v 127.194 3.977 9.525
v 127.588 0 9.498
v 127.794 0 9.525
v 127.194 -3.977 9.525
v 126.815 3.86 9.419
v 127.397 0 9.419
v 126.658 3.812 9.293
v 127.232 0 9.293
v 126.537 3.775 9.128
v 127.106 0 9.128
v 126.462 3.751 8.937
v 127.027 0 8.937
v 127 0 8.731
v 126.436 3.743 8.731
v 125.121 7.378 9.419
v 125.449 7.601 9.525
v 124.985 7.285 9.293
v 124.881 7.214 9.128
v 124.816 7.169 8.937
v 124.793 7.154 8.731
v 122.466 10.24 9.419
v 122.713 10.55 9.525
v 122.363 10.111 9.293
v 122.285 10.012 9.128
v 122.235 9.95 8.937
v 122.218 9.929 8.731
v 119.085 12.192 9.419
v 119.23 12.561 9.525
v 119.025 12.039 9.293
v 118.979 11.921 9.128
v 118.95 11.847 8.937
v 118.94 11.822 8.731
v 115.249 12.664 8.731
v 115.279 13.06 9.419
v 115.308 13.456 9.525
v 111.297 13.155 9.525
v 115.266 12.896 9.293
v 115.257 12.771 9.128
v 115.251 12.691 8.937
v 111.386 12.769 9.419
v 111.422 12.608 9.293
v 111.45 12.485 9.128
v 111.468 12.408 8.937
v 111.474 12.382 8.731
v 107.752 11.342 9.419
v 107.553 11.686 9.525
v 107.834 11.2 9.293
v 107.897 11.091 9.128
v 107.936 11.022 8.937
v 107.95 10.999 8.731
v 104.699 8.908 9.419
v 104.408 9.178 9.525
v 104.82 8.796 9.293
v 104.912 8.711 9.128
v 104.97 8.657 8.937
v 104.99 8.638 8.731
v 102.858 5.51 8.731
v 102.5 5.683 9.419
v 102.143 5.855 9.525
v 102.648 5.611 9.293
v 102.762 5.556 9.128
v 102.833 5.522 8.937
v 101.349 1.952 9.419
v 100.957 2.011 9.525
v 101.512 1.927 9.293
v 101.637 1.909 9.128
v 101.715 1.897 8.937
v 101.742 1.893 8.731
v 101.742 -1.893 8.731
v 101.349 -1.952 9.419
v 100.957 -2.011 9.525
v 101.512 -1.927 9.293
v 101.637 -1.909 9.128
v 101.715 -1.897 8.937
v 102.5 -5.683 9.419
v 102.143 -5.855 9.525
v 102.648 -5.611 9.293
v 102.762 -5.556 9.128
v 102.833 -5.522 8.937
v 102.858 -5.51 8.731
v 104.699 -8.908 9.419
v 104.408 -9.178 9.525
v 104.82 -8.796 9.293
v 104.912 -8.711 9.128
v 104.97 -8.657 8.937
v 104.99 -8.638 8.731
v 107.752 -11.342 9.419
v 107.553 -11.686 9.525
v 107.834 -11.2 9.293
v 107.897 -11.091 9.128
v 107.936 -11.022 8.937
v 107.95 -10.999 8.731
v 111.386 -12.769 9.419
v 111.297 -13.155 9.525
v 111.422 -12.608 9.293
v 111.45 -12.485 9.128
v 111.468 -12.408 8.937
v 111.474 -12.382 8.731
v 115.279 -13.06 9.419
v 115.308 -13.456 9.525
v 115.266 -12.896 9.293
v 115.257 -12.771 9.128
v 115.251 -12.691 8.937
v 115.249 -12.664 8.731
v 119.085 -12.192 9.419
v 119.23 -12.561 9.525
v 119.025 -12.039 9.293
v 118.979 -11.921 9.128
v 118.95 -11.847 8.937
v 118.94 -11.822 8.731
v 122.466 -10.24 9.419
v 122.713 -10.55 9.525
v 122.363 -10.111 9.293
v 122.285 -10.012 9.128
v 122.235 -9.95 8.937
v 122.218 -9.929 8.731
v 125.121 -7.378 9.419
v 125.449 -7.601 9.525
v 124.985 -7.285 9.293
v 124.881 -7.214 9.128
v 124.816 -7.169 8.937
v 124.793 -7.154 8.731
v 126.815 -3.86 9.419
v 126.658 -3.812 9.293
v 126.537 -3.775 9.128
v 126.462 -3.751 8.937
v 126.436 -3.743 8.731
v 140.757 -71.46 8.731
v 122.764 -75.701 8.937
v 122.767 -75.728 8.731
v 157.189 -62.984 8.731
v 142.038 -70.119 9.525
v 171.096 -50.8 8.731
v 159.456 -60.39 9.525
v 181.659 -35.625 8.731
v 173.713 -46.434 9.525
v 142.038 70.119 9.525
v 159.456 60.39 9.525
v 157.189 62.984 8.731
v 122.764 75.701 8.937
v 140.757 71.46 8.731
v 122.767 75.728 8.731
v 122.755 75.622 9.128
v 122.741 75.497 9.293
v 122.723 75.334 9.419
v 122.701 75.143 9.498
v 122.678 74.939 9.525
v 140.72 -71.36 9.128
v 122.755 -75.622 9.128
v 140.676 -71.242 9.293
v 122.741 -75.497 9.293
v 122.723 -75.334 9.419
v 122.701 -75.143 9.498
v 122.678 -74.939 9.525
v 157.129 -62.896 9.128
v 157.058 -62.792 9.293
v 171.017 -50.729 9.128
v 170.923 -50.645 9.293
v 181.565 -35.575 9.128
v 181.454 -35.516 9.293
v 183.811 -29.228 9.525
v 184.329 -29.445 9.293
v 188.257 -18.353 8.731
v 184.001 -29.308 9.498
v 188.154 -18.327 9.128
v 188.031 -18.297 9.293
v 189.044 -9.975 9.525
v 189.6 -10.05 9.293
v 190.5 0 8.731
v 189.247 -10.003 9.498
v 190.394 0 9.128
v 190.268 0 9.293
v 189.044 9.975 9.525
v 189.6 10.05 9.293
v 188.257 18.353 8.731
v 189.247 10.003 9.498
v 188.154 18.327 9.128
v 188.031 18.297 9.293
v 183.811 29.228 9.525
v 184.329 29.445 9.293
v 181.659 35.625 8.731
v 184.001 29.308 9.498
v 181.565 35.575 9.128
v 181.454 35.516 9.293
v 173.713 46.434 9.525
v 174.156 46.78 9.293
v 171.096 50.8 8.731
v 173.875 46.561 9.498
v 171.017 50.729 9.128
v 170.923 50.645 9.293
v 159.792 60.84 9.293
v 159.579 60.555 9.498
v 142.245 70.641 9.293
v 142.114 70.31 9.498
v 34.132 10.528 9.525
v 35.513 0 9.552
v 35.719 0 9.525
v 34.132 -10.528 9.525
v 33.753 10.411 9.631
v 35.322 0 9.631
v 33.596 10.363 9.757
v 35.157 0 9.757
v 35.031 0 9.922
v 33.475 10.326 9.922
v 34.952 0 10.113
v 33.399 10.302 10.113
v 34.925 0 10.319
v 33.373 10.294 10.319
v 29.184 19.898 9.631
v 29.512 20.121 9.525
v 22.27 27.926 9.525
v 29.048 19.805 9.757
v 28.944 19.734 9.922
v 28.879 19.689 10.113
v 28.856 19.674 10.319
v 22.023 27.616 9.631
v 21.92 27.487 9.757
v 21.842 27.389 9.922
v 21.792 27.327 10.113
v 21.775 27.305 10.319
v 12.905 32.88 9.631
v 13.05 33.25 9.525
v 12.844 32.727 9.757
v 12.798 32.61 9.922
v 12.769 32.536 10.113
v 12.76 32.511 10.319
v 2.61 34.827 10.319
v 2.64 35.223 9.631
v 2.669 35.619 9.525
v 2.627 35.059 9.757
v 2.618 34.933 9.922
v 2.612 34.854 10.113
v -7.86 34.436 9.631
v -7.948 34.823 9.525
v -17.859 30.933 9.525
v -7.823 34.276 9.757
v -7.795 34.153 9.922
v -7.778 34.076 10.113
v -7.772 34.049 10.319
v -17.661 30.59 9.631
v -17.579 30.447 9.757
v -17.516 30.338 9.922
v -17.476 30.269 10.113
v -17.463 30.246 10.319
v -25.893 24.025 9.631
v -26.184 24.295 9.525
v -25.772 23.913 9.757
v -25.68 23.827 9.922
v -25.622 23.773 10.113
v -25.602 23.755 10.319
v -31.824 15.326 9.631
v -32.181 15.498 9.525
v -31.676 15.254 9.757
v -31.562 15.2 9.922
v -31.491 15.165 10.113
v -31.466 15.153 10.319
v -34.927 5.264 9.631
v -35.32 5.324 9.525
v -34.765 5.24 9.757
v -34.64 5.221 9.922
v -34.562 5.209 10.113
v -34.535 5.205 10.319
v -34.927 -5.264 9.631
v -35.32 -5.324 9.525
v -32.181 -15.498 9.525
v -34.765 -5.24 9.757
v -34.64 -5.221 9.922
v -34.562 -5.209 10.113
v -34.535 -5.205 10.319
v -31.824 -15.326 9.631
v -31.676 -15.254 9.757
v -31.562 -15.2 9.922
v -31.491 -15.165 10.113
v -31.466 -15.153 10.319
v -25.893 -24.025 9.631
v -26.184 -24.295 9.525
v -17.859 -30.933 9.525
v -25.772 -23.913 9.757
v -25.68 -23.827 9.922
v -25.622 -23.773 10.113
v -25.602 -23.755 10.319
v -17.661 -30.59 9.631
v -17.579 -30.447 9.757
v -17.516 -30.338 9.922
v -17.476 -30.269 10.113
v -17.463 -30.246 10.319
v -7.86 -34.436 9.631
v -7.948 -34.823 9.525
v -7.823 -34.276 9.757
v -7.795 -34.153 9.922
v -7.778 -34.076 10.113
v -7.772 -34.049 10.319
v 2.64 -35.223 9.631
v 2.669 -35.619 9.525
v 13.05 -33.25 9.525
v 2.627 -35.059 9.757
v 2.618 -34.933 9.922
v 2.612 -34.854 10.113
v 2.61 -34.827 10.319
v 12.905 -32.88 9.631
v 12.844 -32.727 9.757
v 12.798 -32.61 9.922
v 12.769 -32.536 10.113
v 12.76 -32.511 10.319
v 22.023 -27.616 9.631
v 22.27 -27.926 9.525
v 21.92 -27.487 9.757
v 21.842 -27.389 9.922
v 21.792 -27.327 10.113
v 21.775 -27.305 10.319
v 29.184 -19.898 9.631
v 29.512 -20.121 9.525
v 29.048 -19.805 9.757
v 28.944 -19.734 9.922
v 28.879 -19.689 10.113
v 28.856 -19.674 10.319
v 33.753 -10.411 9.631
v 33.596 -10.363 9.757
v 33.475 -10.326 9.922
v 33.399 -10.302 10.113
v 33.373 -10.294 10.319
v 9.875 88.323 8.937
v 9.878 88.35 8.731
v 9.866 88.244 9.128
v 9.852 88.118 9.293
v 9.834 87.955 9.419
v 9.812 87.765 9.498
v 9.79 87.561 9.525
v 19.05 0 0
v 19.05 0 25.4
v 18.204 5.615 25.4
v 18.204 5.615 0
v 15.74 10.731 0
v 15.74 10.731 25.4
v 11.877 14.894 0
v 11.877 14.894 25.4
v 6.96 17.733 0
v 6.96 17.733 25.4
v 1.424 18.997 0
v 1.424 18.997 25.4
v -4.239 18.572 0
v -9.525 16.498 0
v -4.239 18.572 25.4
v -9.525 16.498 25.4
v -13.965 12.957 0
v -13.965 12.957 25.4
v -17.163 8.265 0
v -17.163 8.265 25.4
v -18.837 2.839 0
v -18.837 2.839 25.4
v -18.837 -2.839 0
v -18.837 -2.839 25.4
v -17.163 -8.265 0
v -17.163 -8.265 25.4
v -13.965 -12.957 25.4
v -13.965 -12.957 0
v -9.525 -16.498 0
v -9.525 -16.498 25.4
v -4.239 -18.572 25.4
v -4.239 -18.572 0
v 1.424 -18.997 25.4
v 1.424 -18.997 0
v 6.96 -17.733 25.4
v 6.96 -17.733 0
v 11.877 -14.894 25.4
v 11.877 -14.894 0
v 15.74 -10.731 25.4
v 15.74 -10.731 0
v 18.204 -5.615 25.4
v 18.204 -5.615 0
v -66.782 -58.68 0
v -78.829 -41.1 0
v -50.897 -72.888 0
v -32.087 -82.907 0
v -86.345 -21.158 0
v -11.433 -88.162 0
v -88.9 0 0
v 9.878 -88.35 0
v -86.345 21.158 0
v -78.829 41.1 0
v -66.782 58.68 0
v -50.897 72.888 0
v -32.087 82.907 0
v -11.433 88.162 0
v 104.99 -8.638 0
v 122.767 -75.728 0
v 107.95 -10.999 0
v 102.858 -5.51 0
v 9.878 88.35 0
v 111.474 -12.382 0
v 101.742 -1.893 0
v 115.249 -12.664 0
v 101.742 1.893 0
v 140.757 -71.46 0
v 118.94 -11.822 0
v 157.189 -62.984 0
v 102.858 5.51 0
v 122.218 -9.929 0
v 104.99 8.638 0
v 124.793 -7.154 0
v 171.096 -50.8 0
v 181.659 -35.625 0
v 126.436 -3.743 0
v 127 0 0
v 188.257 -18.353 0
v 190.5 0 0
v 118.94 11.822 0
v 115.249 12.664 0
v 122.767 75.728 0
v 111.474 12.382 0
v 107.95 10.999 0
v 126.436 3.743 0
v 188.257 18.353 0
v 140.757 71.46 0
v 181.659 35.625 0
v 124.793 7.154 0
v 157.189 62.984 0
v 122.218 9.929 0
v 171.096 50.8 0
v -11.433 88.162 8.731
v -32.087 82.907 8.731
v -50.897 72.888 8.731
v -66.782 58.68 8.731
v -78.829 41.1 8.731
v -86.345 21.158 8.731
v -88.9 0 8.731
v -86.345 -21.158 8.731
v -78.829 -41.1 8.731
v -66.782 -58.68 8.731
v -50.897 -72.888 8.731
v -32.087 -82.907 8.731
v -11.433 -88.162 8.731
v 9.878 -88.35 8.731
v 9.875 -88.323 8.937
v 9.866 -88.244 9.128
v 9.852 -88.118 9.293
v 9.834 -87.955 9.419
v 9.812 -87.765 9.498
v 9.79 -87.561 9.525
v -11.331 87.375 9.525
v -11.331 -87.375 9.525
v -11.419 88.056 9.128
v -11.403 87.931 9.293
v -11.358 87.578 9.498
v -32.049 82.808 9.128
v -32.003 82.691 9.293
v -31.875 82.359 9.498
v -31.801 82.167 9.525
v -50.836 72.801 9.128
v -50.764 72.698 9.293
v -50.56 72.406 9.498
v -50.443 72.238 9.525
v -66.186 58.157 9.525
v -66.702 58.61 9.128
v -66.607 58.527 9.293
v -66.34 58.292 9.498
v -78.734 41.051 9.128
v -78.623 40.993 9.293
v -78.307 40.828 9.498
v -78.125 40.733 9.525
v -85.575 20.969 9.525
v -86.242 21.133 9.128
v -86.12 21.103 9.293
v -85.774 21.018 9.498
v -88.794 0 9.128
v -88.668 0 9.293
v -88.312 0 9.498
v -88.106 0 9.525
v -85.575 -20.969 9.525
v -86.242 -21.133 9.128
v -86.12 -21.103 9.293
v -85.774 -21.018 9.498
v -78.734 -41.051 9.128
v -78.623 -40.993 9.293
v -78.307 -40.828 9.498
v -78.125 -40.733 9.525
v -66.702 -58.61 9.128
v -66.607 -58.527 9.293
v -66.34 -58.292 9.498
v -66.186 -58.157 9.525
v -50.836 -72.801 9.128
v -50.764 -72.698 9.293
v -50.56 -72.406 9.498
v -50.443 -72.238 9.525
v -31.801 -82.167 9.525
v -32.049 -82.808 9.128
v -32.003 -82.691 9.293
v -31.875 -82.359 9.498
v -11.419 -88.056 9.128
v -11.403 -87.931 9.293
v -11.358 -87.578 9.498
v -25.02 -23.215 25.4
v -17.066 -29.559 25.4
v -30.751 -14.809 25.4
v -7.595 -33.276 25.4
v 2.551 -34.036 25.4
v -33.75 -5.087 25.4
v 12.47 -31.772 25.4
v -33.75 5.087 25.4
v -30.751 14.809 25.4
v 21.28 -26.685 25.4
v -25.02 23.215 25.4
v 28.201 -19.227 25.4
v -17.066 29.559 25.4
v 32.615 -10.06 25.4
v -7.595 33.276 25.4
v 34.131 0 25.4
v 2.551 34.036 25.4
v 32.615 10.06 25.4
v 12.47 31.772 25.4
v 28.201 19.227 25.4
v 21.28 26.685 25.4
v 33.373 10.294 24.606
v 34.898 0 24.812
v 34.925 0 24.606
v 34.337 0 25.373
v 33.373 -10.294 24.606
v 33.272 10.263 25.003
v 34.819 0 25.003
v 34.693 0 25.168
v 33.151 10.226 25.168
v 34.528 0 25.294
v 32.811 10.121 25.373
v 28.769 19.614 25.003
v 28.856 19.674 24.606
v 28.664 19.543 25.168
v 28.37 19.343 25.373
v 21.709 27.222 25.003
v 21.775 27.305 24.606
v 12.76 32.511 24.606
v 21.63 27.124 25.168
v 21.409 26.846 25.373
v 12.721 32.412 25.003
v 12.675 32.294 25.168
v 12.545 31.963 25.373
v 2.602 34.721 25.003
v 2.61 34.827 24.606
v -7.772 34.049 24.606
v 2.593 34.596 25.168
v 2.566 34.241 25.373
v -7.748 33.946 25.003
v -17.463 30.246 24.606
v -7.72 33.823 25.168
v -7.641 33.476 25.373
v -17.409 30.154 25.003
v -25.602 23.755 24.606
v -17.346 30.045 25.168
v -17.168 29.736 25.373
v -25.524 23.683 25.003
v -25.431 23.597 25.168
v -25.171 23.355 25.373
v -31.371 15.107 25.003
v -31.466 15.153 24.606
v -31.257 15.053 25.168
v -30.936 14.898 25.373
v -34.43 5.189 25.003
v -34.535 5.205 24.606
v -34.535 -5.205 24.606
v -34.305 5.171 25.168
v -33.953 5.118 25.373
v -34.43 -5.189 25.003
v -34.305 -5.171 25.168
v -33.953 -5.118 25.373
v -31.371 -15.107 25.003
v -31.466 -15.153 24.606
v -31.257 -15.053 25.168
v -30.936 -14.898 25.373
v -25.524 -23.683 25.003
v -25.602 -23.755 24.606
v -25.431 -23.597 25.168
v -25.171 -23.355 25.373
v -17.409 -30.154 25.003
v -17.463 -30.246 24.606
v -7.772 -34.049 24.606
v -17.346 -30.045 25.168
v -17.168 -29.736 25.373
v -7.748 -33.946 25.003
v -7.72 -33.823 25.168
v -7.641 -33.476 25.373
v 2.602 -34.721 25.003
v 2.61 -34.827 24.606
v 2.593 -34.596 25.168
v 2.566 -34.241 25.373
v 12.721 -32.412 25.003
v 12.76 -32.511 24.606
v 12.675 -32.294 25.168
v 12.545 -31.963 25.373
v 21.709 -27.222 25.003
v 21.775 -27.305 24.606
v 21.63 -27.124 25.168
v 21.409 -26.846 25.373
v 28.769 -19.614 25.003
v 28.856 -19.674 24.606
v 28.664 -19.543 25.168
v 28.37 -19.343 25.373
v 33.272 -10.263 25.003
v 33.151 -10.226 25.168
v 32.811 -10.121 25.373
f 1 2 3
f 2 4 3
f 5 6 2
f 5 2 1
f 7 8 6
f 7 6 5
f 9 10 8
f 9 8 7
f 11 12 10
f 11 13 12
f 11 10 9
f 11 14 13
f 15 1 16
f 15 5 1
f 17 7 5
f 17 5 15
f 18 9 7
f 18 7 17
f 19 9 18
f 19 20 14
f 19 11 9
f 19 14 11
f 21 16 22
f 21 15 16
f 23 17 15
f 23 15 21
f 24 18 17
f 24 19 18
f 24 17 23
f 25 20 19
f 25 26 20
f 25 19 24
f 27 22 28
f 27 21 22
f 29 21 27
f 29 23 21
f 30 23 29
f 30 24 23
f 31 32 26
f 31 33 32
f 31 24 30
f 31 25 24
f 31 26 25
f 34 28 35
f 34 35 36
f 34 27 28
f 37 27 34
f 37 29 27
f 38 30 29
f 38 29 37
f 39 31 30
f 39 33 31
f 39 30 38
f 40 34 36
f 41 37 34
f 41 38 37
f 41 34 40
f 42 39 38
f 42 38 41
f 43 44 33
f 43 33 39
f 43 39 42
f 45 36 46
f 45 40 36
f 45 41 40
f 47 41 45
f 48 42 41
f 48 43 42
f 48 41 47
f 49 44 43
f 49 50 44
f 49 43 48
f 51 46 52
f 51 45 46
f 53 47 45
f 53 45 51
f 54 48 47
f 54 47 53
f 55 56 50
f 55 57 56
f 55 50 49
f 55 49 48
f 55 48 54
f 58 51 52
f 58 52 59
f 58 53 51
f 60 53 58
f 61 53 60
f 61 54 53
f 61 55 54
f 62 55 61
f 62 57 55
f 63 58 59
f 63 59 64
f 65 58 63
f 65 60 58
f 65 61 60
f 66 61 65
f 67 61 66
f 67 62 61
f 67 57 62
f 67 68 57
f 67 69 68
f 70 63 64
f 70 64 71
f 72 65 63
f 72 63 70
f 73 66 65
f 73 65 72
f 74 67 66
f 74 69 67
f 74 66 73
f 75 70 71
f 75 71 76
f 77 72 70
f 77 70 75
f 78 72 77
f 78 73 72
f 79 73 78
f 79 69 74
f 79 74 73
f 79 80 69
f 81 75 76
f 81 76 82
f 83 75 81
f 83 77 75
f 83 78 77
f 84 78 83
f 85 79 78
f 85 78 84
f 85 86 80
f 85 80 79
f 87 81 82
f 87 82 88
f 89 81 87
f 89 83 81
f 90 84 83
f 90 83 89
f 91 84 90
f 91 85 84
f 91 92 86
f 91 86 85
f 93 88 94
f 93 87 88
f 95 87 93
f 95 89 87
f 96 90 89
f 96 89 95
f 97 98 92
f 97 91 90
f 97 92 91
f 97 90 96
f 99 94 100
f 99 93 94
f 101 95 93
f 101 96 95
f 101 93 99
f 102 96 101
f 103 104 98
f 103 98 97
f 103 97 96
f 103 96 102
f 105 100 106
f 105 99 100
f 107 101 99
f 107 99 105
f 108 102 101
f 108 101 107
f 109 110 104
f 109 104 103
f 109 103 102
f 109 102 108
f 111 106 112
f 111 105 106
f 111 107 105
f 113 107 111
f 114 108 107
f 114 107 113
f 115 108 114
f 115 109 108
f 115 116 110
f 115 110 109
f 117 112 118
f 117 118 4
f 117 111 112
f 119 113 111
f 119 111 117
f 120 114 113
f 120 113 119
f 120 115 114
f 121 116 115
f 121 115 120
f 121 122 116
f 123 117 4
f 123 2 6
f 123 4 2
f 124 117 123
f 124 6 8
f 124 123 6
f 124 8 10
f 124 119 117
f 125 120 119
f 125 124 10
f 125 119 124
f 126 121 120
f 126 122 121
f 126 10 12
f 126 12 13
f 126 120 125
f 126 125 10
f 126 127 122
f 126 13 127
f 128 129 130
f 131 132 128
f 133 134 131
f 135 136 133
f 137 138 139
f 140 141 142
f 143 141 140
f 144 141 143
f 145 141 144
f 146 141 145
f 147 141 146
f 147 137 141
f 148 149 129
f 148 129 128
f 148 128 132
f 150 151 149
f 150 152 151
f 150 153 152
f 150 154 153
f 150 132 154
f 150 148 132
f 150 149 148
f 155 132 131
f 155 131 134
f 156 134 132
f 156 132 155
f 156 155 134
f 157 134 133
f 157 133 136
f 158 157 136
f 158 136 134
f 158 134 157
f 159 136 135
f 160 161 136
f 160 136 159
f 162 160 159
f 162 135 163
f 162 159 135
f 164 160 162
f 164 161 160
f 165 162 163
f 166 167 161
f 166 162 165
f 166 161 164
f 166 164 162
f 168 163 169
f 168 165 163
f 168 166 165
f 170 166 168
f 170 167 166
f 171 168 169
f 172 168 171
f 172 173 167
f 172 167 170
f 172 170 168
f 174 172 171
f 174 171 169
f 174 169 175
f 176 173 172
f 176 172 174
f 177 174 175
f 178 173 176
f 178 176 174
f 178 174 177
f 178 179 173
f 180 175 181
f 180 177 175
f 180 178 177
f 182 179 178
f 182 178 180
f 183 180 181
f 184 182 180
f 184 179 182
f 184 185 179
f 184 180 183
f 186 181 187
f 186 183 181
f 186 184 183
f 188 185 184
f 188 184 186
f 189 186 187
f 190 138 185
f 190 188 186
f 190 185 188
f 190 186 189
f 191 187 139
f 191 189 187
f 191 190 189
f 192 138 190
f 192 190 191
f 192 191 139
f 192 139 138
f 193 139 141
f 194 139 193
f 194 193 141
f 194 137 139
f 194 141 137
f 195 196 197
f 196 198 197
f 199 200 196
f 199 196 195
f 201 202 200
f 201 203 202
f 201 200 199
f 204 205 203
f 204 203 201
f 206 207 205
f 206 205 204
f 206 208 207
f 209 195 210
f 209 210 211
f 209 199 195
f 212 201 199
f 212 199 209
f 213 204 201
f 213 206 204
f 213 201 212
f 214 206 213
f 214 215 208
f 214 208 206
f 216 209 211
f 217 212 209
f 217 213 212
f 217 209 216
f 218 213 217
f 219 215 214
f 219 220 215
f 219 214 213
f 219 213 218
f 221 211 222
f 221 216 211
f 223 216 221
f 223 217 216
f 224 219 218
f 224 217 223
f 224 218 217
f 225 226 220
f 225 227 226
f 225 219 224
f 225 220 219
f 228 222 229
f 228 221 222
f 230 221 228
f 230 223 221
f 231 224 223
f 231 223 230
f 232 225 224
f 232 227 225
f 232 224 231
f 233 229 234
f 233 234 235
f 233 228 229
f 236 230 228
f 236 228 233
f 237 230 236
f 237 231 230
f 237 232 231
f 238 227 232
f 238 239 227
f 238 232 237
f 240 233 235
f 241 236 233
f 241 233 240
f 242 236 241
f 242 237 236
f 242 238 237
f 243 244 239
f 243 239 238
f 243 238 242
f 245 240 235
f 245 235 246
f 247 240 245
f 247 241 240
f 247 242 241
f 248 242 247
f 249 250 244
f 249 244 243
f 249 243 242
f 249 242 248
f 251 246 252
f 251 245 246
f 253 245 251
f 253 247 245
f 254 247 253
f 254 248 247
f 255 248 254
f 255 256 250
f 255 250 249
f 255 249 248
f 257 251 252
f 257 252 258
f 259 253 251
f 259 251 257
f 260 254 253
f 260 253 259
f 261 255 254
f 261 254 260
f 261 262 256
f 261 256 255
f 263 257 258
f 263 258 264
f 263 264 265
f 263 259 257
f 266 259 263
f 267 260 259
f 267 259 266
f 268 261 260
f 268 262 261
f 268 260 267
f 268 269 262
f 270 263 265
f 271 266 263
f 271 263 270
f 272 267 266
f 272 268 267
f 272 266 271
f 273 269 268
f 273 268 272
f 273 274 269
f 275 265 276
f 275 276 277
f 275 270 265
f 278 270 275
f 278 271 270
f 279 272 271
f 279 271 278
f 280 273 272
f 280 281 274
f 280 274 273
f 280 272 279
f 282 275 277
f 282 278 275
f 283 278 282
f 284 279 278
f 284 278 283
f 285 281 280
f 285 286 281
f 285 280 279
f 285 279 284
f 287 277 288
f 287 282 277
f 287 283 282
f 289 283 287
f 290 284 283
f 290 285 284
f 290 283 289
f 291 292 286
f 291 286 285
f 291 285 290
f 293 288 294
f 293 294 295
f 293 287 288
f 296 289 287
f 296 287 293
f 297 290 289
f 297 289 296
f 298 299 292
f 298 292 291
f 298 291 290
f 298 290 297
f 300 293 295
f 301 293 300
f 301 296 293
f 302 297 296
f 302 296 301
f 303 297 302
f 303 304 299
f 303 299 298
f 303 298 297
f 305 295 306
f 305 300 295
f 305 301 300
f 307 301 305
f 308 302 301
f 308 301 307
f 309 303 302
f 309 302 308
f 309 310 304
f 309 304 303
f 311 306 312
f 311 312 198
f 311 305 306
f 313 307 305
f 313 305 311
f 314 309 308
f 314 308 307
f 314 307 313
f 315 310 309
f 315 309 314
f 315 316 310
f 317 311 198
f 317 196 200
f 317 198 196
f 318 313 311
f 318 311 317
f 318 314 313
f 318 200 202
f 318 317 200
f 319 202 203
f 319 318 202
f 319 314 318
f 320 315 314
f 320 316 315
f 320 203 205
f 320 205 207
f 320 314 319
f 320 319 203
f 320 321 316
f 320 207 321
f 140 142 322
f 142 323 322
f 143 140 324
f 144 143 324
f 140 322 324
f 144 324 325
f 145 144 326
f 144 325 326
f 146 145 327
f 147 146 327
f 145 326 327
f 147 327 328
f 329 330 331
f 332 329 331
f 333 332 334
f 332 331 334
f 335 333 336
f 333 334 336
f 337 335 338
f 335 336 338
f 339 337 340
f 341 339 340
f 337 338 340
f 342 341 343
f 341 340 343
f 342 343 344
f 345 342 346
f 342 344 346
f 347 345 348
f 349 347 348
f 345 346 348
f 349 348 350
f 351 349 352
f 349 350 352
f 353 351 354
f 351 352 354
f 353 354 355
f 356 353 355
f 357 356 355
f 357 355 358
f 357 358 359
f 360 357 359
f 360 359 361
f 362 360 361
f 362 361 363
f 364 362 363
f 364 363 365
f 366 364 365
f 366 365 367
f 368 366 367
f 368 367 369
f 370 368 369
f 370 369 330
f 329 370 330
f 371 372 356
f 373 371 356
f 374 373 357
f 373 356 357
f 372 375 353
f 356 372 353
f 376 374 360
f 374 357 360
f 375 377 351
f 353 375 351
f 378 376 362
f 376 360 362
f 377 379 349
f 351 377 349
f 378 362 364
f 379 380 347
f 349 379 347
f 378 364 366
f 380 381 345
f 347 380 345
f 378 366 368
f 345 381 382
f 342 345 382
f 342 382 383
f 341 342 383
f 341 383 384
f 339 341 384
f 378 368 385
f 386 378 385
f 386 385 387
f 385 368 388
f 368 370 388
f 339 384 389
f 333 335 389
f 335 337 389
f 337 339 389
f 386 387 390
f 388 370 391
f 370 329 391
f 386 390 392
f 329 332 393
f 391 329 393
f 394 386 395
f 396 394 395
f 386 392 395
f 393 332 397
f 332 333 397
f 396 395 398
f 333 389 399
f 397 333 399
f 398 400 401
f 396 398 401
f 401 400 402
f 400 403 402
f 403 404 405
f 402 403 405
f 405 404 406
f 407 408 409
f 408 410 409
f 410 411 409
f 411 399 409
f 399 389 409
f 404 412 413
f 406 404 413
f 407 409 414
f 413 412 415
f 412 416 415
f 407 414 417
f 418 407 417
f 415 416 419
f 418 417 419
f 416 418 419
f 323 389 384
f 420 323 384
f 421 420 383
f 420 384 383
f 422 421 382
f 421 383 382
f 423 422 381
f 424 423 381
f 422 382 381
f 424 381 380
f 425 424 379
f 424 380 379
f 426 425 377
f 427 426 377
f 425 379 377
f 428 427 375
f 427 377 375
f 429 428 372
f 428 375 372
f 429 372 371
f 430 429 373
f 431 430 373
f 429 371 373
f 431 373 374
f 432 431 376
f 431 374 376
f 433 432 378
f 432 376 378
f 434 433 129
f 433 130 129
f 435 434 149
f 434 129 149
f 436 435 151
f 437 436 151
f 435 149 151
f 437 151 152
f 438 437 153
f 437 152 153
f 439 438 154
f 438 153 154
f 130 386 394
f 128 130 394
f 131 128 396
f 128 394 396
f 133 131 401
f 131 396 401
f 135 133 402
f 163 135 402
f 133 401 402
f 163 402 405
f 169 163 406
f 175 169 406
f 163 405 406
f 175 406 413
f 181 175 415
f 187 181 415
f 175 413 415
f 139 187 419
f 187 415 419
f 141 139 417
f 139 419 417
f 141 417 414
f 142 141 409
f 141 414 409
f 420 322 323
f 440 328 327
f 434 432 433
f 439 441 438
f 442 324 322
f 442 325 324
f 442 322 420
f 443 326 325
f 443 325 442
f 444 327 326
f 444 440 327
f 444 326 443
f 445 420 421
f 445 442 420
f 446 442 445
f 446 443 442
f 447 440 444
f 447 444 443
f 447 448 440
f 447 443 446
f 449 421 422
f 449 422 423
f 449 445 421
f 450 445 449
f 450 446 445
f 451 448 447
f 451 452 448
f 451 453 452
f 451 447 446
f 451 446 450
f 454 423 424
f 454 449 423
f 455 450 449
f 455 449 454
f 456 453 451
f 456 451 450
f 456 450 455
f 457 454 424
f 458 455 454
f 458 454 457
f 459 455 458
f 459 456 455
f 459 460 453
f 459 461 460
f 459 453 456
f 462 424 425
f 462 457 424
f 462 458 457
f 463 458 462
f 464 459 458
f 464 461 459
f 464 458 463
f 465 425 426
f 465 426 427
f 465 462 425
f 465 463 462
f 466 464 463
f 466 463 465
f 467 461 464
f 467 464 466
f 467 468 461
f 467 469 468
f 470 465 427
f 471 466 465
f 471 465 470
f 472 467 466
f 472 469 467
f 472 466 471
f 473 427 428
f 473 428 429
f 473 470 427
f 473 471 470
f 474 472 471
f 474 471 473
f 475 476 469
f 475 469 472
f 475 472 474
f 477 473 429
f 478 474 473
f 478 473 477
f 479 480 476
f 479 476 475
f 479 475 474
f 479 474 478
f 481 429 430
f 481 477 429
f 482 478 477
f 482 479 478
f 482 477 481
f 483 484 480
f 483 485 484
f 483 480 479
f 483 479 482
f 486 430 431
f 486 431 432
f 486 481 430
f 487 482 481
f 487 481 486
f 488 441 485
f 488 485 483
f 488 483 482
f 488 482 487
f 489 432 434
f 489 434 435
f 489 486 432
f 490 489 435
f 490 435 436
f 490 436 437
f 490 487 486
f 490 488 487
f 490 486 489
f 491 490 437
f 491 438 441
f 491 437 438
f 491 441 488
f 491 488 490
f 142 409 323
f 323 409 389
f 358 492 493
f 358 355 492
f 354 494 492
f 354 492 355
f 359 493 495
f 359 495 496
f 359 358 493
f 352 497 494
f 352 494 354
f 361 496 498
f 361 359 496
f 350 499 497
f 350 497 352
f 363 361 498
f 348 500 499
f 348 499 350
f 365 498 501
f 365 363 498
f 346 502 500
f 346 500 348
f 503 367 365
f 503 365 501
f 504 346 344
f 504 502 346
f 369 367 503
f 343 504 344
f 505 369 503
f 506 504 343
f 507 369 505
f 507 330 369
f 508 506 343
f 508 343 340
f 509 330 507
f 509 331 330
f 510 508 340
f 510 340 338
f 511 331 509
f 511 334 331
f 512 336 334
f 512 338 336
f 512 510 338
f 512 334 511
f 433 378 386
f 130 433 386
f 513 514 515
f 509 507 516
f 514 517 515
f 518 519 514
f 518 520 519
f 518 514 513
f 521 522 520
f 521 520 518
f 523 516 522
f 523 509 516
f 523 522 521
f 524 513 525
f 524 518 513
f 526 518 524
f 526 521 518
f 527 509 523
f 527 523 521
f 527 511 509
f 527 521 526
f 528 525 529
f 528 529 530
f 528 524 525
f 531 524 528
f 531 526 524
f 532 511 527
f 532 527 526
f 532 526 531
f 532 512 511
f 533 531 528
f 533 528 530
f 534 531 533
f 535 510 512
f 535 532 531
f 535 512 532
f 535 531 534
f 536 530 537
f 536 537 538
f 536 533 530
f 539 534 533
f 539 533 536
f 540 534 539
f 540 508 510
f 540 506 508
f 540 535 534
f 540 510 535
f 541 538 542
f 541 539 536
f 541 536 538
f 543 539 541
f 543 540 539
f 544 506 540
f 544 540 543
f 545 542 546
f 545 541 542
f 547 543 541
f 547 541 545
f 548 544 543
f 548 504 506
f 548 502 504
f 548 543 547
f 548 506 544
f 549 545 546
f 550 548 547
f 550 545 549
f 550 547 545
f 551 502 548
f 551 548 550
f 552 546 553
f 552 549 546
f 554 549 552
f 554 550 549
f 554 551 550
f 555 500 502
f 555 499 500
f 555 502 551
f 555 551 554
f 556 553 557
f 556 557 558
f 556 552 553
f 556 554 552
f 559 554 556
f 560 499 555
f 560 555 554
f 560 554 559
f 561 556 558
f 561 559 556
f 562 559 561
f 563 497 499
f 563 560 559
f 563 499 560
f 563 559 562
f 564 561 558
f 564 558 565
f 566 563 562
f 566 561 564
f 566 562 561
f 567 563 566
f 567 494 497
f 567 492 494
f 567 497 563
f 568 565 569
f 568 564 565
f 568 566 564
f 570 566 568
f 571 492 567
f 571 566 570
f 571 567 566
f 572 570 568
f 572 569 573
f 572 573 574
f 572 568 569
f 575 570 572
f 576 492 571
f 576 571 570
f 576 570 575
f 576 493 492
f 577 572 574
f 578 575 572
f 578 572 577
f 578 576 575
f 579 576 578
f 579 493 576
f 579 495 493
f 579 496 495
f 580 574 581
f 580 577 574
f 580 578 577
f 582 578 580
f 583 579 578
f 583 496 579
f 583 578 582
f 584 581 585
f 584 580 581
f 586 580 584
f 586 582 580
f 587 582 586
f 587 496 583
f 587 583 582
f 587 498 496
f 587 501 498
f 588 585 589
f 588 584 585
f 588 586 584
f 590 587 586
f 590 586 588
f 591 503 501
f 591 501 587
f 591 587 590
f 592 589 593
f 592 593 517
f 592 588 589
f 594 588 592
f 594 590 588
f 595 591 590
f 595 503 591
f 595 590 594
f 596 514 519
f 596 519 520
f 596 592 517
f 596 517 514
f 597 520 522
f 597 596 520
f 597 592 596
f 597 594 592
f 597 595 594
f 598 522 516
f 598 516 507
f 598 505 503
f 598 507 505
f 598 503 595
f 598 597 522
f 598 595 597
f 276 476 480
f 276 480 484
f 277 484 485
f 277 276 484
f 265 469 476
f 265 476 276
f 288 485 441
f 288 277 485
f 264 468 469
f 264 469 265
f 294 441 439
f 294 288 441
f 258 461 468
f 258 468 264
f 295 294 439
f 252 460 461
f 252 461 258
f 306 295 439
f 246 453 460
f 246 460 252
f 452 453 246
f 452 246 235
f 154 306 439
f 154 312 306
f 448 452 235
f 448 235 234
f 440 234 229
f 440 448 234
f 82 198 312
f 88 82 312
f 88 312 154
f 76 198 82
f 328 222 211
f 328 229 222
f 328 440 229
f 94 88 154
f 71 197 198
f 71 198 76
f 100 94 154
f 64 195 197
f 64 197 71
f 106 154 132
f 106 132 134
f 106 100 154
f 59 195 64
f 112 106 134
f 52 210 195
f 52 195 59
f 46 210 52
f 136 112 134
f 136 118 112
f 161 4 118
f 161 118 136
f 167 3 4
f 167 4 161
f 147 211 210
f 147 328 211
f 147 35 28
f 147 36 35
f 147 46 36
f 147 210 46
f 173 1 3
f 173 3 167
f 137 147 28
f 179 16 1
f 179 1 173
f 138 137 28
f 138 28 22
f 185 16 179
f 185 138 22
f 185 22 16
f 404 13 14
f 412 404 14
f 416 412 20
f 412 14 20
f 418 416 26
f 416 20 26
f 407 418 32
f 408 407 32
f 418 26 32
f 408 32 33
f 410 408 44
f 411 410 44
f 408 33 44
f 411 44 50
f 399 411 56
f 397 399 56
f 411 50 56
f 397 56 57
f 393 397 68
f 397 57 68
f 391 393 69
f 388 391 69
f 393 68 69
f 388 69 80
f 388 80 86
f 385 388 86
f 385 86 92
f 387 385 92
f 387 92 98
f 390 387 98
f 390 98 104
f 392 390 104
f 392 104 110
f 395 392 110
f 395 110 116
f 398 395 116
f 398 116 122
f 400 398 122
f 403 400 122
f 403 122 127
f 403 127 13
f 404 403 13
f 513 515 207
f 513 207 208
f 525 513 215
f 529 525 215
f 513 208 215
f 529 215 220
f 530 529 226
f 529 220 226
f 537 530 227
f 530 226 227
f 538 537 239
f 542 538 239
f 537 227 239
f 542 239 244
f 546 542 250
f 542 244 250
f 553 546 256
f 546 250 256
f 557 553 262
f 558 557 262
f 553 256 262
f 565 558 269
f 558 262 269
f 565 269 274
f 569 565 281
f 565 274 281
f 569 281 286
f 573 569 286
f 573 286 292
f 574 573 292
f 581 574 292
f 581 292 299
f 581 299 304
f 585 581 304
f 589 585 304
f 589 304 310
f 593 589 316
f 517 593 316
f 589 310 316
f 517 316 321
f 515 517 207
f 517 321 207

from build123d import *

# Parameters (mm, degrees)
F1_DEPTH = 9.525
F2_R     = 34.925
F3_DEPTH = 15.875
F4_R     = 19.05
F4_R_2   = 12.7
F5_DEPTH = 25.401
F6_R     = 0.79375


with BuildPart() as f1:
    # F0 (on Top) → F1 (new body)
    with BuildSketch(Plane.XY):
        with BuildLine():
            Line((122.766667, 75.728169), (9.877778, 88.34953))
            ThreePointArc((9.877778, 88.34953), (-88.9, 0), (9.877778, -88.34953))
            Line((9.877778, -88.34953), (122.766667, -75.728169))
            ThreePointArc((122.766667, -75.728169), (190.5, 0), (122.766667, 75.728169))
        make_face()
    extrude(amount=F1_DEPTH)

    # F2 (on face) → F3 (join)
    with BuildSketch(Plane.XY.offset(9.525)):
        Circle(F2_R)
    extrude(amount=F3_DEPTH)

    # F4 (on face) → F5 (cut, through all)
    with BuildSketch(Plane.XY.offset(25.4)):
        Circle(F4_R)
        with Locations((114.3, 0)):
            Circle(F4_R_2)
    extrude(amount=-F5_DEPTH, mode=Mode.SUBTRACT)

    # F6
    f6_edges = [f1.edges().sort_by_distance(p)[0] for p in [
        (-34.925, 0, 9.525),
        (-34.925, 0, 25.4),
        (190.5, 0, 9.525),
        (66.322222, -82.03885, 9.525),
        (-88.9, 0, 9.525),
        (66.322222, 82.03885, 9.525),
        (101.6, 0, 9.525),
    ]]
    fillet(f6_edges, radius=F6_R)


solid = f1.part
